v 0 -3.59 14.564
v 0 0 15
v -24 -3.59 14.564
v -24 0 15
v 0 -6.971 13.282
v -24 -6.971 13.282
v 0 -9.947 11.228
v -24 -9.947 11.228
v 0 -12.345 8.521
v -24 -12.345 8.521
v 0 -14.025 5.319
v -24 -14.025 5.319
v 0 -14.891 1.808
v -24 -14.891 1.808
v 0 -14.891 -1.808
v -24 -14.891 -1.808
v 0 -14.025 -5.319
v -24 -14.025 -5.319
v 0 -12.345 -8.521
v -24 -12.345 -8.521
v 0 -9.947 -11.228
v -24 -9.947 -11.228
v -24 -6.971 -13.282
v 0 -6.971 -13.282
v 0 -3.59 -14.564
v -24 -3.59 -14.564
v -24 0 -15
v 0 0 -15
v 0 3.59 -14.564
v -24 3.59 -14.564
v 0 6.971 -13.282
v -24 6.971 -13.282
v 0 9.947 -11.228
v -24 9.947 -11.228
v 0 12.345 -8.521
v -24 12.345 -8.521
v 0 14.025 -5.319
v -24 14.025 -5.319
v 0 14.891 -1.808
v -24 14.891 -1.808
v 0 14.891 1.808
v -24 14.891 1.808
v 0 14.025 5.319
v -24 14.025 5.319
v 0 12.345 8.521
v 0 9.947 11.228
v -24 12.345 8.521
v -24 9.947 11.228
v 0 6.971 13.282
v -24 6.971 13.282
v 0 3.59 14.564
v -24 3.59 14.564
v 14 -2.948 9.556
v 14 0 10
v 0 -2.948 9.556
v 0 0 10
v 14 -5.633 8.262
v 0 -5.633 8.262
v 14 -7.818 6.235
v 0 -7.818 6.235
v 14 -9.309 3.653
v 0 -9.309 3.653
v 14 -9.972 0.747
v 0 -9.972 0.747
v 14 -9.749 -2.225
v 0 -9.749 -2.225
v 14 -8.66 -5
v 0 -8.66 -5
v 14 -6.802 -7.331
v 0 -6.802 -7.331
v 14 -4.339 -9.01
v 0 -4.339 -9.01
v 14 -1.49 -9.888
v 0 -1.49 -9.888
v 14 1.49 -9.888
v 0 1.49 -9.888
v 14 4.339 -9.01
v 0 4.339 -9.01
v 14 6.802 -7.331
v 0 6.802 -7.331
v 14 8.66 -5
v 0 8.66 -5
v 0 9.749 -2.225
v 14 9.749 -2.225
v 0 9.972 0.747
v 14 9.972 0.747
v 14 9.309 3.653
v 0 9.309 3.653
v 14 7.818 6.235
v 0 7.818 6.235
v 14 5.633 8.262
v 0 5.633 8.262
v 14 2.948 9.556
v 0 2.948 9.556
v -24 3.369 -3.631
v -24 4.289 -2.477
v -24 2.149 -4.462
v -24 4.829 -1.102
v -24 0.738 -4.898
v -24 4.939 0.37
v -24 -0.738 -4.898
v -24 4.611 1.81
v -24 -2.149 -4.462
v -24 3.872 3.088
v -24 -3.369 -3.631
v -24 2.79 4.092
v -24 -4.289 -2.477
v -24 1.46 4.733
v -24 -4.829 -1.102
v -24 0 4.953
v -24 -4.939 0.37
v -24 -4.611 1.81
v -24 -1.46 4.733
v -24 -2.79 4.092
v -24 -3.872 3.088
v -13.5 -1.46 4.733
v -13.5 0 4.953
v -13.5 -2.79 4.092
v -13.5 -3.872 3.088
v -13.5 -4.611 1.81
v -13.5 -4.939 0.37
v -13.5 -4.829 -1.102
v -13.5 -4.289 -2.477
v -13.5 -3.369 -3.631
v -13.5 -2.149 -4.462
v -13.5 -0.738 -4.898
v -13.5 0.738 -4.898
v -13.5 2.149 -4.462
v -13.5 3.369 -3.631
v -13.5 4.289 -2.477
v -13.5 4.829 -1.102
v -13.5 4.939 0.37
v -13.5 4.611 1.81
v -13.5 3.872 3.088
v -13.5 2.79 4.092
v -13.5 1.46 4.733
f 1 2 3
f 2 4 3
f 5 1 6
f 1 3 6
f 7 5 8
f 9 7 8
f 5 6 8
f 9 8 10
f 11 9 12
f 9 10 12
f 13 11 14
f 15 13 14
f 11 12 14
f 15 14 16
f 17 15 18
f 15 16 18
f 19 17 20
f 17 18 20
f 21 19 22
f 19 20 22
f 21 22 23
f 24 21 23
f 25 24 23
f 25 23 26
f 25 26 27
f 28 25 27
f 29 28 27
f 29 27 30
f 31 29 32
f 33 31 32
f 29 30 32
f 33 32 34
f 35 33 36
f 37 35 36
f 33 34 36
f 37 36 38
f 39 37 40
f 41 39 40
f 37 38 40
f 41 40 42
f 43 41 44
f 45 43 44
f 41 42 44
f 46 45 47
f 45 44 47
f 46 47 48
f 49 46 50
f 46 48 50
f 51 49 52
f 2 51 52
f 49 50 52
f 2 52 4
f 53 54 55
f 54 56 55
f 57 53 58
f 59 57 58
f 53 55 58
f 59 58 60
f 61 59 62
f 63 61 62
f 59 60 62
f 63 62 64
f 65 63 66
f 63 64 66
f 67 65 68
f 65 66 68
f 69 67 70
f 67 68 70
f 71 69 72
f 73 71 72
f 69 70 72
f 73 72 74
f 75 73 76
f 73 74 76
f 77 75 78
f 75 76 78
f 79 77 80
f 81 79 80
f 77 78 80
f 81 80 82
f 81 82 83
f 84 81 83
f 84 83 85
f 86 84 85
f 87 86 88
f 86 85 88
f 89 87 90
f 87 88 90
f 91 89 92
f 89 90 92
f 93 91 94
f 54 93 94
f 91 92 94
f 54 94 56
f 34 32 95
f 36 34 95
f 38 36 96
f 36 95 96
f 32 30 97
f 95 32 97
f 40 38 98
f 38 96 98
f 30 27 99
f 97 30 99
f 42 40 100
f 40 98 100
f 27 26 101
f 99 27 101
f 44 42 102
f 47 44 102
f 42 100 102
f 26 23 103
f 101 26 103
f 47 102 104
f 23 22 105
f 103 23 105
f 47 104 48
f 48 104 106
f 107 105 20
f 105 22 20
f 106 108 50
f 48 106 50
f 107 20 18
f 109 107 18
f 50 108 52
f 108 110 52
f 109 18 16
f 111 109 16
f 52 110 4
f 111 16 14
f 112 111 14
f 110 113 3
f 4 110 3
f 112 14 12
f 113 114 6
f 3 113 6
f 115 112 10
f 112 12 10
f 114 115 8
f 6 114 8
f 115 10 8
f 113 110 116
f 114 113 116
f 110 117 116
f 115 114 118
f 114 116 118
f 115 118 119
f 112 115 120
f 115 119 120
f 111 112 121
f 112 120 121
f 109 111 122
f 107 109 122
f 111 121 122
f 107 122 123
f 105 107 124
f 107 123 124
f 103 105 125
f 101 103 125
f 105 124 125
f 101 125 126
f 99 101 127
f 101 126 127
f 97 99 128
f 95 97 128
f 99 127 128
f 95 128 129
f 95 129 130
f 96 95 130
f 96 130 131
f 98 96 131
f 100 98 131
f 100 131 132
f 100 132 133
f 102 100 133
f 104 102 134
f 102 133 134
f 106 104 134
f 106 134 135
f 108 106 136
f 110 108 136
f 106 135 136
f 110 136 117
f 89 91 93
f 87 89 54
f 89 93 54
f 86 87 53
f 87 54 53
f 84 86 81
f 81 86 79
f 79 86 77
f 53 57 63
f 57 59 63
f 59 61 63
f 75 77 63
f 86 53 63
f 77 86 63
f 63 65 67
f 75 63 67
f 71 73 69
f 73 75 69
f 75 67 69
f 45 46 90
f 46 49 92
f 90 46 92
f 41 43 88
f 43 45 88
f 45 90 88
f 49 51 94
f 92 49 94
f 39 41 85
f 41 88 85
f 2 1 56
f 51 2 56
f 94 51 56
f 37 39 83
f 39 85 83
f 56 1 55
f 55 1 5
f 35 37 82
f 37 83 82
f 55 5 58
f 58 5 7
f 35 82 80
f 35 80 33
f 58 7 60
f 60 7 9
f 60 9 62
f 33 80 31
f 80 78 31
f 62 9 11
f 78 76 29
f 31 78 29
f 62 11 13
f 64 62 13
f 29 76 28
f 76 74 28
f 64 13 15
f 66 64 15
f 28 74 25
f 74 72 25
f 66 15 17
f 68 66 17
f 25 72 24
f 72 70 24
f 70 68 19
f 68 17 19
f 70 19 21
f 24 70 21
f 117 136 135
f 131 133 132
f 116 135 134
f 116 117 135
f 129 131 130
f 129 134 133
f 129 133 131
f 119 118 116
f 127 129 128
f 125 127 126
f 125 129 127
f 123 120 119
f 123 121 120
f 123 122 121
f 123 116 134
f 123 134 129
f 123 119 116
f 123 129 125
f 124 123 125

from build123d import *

# Parameters (mm, degrees)
SOCKET_1_SKETCH_W = 11.5
SOCKET_1_SKETCH_H = 4.953


with BuildPart() as part:
    # Reg_Outlet_Upper Sketch → Reg_Outlet_Upper (revolve)
    with BuildSketch(Plane.XY):
        Polygon((14, 0), (14, 10), (0, 10), (0, 15), (-24, 15), (-24, 0), align=None)
    revolve(axis=Axis((-1000, 0, 0), (1, 0, 0)))

    # Socket 1 Sketch → Socket 1 (revolve, cut)
    with BuildSketch(Plane.XY):
        with Locations((-19.25, 2.4765)):
            Rectangle(SOCKET_1_SKETCH_W, SOCKET_1_SKETCH_H)
    revolve(axis=Axis((-1000, 0, 0), (1, 0, 0)), mode=Mode.SUBTRACT)


solid = part.part
